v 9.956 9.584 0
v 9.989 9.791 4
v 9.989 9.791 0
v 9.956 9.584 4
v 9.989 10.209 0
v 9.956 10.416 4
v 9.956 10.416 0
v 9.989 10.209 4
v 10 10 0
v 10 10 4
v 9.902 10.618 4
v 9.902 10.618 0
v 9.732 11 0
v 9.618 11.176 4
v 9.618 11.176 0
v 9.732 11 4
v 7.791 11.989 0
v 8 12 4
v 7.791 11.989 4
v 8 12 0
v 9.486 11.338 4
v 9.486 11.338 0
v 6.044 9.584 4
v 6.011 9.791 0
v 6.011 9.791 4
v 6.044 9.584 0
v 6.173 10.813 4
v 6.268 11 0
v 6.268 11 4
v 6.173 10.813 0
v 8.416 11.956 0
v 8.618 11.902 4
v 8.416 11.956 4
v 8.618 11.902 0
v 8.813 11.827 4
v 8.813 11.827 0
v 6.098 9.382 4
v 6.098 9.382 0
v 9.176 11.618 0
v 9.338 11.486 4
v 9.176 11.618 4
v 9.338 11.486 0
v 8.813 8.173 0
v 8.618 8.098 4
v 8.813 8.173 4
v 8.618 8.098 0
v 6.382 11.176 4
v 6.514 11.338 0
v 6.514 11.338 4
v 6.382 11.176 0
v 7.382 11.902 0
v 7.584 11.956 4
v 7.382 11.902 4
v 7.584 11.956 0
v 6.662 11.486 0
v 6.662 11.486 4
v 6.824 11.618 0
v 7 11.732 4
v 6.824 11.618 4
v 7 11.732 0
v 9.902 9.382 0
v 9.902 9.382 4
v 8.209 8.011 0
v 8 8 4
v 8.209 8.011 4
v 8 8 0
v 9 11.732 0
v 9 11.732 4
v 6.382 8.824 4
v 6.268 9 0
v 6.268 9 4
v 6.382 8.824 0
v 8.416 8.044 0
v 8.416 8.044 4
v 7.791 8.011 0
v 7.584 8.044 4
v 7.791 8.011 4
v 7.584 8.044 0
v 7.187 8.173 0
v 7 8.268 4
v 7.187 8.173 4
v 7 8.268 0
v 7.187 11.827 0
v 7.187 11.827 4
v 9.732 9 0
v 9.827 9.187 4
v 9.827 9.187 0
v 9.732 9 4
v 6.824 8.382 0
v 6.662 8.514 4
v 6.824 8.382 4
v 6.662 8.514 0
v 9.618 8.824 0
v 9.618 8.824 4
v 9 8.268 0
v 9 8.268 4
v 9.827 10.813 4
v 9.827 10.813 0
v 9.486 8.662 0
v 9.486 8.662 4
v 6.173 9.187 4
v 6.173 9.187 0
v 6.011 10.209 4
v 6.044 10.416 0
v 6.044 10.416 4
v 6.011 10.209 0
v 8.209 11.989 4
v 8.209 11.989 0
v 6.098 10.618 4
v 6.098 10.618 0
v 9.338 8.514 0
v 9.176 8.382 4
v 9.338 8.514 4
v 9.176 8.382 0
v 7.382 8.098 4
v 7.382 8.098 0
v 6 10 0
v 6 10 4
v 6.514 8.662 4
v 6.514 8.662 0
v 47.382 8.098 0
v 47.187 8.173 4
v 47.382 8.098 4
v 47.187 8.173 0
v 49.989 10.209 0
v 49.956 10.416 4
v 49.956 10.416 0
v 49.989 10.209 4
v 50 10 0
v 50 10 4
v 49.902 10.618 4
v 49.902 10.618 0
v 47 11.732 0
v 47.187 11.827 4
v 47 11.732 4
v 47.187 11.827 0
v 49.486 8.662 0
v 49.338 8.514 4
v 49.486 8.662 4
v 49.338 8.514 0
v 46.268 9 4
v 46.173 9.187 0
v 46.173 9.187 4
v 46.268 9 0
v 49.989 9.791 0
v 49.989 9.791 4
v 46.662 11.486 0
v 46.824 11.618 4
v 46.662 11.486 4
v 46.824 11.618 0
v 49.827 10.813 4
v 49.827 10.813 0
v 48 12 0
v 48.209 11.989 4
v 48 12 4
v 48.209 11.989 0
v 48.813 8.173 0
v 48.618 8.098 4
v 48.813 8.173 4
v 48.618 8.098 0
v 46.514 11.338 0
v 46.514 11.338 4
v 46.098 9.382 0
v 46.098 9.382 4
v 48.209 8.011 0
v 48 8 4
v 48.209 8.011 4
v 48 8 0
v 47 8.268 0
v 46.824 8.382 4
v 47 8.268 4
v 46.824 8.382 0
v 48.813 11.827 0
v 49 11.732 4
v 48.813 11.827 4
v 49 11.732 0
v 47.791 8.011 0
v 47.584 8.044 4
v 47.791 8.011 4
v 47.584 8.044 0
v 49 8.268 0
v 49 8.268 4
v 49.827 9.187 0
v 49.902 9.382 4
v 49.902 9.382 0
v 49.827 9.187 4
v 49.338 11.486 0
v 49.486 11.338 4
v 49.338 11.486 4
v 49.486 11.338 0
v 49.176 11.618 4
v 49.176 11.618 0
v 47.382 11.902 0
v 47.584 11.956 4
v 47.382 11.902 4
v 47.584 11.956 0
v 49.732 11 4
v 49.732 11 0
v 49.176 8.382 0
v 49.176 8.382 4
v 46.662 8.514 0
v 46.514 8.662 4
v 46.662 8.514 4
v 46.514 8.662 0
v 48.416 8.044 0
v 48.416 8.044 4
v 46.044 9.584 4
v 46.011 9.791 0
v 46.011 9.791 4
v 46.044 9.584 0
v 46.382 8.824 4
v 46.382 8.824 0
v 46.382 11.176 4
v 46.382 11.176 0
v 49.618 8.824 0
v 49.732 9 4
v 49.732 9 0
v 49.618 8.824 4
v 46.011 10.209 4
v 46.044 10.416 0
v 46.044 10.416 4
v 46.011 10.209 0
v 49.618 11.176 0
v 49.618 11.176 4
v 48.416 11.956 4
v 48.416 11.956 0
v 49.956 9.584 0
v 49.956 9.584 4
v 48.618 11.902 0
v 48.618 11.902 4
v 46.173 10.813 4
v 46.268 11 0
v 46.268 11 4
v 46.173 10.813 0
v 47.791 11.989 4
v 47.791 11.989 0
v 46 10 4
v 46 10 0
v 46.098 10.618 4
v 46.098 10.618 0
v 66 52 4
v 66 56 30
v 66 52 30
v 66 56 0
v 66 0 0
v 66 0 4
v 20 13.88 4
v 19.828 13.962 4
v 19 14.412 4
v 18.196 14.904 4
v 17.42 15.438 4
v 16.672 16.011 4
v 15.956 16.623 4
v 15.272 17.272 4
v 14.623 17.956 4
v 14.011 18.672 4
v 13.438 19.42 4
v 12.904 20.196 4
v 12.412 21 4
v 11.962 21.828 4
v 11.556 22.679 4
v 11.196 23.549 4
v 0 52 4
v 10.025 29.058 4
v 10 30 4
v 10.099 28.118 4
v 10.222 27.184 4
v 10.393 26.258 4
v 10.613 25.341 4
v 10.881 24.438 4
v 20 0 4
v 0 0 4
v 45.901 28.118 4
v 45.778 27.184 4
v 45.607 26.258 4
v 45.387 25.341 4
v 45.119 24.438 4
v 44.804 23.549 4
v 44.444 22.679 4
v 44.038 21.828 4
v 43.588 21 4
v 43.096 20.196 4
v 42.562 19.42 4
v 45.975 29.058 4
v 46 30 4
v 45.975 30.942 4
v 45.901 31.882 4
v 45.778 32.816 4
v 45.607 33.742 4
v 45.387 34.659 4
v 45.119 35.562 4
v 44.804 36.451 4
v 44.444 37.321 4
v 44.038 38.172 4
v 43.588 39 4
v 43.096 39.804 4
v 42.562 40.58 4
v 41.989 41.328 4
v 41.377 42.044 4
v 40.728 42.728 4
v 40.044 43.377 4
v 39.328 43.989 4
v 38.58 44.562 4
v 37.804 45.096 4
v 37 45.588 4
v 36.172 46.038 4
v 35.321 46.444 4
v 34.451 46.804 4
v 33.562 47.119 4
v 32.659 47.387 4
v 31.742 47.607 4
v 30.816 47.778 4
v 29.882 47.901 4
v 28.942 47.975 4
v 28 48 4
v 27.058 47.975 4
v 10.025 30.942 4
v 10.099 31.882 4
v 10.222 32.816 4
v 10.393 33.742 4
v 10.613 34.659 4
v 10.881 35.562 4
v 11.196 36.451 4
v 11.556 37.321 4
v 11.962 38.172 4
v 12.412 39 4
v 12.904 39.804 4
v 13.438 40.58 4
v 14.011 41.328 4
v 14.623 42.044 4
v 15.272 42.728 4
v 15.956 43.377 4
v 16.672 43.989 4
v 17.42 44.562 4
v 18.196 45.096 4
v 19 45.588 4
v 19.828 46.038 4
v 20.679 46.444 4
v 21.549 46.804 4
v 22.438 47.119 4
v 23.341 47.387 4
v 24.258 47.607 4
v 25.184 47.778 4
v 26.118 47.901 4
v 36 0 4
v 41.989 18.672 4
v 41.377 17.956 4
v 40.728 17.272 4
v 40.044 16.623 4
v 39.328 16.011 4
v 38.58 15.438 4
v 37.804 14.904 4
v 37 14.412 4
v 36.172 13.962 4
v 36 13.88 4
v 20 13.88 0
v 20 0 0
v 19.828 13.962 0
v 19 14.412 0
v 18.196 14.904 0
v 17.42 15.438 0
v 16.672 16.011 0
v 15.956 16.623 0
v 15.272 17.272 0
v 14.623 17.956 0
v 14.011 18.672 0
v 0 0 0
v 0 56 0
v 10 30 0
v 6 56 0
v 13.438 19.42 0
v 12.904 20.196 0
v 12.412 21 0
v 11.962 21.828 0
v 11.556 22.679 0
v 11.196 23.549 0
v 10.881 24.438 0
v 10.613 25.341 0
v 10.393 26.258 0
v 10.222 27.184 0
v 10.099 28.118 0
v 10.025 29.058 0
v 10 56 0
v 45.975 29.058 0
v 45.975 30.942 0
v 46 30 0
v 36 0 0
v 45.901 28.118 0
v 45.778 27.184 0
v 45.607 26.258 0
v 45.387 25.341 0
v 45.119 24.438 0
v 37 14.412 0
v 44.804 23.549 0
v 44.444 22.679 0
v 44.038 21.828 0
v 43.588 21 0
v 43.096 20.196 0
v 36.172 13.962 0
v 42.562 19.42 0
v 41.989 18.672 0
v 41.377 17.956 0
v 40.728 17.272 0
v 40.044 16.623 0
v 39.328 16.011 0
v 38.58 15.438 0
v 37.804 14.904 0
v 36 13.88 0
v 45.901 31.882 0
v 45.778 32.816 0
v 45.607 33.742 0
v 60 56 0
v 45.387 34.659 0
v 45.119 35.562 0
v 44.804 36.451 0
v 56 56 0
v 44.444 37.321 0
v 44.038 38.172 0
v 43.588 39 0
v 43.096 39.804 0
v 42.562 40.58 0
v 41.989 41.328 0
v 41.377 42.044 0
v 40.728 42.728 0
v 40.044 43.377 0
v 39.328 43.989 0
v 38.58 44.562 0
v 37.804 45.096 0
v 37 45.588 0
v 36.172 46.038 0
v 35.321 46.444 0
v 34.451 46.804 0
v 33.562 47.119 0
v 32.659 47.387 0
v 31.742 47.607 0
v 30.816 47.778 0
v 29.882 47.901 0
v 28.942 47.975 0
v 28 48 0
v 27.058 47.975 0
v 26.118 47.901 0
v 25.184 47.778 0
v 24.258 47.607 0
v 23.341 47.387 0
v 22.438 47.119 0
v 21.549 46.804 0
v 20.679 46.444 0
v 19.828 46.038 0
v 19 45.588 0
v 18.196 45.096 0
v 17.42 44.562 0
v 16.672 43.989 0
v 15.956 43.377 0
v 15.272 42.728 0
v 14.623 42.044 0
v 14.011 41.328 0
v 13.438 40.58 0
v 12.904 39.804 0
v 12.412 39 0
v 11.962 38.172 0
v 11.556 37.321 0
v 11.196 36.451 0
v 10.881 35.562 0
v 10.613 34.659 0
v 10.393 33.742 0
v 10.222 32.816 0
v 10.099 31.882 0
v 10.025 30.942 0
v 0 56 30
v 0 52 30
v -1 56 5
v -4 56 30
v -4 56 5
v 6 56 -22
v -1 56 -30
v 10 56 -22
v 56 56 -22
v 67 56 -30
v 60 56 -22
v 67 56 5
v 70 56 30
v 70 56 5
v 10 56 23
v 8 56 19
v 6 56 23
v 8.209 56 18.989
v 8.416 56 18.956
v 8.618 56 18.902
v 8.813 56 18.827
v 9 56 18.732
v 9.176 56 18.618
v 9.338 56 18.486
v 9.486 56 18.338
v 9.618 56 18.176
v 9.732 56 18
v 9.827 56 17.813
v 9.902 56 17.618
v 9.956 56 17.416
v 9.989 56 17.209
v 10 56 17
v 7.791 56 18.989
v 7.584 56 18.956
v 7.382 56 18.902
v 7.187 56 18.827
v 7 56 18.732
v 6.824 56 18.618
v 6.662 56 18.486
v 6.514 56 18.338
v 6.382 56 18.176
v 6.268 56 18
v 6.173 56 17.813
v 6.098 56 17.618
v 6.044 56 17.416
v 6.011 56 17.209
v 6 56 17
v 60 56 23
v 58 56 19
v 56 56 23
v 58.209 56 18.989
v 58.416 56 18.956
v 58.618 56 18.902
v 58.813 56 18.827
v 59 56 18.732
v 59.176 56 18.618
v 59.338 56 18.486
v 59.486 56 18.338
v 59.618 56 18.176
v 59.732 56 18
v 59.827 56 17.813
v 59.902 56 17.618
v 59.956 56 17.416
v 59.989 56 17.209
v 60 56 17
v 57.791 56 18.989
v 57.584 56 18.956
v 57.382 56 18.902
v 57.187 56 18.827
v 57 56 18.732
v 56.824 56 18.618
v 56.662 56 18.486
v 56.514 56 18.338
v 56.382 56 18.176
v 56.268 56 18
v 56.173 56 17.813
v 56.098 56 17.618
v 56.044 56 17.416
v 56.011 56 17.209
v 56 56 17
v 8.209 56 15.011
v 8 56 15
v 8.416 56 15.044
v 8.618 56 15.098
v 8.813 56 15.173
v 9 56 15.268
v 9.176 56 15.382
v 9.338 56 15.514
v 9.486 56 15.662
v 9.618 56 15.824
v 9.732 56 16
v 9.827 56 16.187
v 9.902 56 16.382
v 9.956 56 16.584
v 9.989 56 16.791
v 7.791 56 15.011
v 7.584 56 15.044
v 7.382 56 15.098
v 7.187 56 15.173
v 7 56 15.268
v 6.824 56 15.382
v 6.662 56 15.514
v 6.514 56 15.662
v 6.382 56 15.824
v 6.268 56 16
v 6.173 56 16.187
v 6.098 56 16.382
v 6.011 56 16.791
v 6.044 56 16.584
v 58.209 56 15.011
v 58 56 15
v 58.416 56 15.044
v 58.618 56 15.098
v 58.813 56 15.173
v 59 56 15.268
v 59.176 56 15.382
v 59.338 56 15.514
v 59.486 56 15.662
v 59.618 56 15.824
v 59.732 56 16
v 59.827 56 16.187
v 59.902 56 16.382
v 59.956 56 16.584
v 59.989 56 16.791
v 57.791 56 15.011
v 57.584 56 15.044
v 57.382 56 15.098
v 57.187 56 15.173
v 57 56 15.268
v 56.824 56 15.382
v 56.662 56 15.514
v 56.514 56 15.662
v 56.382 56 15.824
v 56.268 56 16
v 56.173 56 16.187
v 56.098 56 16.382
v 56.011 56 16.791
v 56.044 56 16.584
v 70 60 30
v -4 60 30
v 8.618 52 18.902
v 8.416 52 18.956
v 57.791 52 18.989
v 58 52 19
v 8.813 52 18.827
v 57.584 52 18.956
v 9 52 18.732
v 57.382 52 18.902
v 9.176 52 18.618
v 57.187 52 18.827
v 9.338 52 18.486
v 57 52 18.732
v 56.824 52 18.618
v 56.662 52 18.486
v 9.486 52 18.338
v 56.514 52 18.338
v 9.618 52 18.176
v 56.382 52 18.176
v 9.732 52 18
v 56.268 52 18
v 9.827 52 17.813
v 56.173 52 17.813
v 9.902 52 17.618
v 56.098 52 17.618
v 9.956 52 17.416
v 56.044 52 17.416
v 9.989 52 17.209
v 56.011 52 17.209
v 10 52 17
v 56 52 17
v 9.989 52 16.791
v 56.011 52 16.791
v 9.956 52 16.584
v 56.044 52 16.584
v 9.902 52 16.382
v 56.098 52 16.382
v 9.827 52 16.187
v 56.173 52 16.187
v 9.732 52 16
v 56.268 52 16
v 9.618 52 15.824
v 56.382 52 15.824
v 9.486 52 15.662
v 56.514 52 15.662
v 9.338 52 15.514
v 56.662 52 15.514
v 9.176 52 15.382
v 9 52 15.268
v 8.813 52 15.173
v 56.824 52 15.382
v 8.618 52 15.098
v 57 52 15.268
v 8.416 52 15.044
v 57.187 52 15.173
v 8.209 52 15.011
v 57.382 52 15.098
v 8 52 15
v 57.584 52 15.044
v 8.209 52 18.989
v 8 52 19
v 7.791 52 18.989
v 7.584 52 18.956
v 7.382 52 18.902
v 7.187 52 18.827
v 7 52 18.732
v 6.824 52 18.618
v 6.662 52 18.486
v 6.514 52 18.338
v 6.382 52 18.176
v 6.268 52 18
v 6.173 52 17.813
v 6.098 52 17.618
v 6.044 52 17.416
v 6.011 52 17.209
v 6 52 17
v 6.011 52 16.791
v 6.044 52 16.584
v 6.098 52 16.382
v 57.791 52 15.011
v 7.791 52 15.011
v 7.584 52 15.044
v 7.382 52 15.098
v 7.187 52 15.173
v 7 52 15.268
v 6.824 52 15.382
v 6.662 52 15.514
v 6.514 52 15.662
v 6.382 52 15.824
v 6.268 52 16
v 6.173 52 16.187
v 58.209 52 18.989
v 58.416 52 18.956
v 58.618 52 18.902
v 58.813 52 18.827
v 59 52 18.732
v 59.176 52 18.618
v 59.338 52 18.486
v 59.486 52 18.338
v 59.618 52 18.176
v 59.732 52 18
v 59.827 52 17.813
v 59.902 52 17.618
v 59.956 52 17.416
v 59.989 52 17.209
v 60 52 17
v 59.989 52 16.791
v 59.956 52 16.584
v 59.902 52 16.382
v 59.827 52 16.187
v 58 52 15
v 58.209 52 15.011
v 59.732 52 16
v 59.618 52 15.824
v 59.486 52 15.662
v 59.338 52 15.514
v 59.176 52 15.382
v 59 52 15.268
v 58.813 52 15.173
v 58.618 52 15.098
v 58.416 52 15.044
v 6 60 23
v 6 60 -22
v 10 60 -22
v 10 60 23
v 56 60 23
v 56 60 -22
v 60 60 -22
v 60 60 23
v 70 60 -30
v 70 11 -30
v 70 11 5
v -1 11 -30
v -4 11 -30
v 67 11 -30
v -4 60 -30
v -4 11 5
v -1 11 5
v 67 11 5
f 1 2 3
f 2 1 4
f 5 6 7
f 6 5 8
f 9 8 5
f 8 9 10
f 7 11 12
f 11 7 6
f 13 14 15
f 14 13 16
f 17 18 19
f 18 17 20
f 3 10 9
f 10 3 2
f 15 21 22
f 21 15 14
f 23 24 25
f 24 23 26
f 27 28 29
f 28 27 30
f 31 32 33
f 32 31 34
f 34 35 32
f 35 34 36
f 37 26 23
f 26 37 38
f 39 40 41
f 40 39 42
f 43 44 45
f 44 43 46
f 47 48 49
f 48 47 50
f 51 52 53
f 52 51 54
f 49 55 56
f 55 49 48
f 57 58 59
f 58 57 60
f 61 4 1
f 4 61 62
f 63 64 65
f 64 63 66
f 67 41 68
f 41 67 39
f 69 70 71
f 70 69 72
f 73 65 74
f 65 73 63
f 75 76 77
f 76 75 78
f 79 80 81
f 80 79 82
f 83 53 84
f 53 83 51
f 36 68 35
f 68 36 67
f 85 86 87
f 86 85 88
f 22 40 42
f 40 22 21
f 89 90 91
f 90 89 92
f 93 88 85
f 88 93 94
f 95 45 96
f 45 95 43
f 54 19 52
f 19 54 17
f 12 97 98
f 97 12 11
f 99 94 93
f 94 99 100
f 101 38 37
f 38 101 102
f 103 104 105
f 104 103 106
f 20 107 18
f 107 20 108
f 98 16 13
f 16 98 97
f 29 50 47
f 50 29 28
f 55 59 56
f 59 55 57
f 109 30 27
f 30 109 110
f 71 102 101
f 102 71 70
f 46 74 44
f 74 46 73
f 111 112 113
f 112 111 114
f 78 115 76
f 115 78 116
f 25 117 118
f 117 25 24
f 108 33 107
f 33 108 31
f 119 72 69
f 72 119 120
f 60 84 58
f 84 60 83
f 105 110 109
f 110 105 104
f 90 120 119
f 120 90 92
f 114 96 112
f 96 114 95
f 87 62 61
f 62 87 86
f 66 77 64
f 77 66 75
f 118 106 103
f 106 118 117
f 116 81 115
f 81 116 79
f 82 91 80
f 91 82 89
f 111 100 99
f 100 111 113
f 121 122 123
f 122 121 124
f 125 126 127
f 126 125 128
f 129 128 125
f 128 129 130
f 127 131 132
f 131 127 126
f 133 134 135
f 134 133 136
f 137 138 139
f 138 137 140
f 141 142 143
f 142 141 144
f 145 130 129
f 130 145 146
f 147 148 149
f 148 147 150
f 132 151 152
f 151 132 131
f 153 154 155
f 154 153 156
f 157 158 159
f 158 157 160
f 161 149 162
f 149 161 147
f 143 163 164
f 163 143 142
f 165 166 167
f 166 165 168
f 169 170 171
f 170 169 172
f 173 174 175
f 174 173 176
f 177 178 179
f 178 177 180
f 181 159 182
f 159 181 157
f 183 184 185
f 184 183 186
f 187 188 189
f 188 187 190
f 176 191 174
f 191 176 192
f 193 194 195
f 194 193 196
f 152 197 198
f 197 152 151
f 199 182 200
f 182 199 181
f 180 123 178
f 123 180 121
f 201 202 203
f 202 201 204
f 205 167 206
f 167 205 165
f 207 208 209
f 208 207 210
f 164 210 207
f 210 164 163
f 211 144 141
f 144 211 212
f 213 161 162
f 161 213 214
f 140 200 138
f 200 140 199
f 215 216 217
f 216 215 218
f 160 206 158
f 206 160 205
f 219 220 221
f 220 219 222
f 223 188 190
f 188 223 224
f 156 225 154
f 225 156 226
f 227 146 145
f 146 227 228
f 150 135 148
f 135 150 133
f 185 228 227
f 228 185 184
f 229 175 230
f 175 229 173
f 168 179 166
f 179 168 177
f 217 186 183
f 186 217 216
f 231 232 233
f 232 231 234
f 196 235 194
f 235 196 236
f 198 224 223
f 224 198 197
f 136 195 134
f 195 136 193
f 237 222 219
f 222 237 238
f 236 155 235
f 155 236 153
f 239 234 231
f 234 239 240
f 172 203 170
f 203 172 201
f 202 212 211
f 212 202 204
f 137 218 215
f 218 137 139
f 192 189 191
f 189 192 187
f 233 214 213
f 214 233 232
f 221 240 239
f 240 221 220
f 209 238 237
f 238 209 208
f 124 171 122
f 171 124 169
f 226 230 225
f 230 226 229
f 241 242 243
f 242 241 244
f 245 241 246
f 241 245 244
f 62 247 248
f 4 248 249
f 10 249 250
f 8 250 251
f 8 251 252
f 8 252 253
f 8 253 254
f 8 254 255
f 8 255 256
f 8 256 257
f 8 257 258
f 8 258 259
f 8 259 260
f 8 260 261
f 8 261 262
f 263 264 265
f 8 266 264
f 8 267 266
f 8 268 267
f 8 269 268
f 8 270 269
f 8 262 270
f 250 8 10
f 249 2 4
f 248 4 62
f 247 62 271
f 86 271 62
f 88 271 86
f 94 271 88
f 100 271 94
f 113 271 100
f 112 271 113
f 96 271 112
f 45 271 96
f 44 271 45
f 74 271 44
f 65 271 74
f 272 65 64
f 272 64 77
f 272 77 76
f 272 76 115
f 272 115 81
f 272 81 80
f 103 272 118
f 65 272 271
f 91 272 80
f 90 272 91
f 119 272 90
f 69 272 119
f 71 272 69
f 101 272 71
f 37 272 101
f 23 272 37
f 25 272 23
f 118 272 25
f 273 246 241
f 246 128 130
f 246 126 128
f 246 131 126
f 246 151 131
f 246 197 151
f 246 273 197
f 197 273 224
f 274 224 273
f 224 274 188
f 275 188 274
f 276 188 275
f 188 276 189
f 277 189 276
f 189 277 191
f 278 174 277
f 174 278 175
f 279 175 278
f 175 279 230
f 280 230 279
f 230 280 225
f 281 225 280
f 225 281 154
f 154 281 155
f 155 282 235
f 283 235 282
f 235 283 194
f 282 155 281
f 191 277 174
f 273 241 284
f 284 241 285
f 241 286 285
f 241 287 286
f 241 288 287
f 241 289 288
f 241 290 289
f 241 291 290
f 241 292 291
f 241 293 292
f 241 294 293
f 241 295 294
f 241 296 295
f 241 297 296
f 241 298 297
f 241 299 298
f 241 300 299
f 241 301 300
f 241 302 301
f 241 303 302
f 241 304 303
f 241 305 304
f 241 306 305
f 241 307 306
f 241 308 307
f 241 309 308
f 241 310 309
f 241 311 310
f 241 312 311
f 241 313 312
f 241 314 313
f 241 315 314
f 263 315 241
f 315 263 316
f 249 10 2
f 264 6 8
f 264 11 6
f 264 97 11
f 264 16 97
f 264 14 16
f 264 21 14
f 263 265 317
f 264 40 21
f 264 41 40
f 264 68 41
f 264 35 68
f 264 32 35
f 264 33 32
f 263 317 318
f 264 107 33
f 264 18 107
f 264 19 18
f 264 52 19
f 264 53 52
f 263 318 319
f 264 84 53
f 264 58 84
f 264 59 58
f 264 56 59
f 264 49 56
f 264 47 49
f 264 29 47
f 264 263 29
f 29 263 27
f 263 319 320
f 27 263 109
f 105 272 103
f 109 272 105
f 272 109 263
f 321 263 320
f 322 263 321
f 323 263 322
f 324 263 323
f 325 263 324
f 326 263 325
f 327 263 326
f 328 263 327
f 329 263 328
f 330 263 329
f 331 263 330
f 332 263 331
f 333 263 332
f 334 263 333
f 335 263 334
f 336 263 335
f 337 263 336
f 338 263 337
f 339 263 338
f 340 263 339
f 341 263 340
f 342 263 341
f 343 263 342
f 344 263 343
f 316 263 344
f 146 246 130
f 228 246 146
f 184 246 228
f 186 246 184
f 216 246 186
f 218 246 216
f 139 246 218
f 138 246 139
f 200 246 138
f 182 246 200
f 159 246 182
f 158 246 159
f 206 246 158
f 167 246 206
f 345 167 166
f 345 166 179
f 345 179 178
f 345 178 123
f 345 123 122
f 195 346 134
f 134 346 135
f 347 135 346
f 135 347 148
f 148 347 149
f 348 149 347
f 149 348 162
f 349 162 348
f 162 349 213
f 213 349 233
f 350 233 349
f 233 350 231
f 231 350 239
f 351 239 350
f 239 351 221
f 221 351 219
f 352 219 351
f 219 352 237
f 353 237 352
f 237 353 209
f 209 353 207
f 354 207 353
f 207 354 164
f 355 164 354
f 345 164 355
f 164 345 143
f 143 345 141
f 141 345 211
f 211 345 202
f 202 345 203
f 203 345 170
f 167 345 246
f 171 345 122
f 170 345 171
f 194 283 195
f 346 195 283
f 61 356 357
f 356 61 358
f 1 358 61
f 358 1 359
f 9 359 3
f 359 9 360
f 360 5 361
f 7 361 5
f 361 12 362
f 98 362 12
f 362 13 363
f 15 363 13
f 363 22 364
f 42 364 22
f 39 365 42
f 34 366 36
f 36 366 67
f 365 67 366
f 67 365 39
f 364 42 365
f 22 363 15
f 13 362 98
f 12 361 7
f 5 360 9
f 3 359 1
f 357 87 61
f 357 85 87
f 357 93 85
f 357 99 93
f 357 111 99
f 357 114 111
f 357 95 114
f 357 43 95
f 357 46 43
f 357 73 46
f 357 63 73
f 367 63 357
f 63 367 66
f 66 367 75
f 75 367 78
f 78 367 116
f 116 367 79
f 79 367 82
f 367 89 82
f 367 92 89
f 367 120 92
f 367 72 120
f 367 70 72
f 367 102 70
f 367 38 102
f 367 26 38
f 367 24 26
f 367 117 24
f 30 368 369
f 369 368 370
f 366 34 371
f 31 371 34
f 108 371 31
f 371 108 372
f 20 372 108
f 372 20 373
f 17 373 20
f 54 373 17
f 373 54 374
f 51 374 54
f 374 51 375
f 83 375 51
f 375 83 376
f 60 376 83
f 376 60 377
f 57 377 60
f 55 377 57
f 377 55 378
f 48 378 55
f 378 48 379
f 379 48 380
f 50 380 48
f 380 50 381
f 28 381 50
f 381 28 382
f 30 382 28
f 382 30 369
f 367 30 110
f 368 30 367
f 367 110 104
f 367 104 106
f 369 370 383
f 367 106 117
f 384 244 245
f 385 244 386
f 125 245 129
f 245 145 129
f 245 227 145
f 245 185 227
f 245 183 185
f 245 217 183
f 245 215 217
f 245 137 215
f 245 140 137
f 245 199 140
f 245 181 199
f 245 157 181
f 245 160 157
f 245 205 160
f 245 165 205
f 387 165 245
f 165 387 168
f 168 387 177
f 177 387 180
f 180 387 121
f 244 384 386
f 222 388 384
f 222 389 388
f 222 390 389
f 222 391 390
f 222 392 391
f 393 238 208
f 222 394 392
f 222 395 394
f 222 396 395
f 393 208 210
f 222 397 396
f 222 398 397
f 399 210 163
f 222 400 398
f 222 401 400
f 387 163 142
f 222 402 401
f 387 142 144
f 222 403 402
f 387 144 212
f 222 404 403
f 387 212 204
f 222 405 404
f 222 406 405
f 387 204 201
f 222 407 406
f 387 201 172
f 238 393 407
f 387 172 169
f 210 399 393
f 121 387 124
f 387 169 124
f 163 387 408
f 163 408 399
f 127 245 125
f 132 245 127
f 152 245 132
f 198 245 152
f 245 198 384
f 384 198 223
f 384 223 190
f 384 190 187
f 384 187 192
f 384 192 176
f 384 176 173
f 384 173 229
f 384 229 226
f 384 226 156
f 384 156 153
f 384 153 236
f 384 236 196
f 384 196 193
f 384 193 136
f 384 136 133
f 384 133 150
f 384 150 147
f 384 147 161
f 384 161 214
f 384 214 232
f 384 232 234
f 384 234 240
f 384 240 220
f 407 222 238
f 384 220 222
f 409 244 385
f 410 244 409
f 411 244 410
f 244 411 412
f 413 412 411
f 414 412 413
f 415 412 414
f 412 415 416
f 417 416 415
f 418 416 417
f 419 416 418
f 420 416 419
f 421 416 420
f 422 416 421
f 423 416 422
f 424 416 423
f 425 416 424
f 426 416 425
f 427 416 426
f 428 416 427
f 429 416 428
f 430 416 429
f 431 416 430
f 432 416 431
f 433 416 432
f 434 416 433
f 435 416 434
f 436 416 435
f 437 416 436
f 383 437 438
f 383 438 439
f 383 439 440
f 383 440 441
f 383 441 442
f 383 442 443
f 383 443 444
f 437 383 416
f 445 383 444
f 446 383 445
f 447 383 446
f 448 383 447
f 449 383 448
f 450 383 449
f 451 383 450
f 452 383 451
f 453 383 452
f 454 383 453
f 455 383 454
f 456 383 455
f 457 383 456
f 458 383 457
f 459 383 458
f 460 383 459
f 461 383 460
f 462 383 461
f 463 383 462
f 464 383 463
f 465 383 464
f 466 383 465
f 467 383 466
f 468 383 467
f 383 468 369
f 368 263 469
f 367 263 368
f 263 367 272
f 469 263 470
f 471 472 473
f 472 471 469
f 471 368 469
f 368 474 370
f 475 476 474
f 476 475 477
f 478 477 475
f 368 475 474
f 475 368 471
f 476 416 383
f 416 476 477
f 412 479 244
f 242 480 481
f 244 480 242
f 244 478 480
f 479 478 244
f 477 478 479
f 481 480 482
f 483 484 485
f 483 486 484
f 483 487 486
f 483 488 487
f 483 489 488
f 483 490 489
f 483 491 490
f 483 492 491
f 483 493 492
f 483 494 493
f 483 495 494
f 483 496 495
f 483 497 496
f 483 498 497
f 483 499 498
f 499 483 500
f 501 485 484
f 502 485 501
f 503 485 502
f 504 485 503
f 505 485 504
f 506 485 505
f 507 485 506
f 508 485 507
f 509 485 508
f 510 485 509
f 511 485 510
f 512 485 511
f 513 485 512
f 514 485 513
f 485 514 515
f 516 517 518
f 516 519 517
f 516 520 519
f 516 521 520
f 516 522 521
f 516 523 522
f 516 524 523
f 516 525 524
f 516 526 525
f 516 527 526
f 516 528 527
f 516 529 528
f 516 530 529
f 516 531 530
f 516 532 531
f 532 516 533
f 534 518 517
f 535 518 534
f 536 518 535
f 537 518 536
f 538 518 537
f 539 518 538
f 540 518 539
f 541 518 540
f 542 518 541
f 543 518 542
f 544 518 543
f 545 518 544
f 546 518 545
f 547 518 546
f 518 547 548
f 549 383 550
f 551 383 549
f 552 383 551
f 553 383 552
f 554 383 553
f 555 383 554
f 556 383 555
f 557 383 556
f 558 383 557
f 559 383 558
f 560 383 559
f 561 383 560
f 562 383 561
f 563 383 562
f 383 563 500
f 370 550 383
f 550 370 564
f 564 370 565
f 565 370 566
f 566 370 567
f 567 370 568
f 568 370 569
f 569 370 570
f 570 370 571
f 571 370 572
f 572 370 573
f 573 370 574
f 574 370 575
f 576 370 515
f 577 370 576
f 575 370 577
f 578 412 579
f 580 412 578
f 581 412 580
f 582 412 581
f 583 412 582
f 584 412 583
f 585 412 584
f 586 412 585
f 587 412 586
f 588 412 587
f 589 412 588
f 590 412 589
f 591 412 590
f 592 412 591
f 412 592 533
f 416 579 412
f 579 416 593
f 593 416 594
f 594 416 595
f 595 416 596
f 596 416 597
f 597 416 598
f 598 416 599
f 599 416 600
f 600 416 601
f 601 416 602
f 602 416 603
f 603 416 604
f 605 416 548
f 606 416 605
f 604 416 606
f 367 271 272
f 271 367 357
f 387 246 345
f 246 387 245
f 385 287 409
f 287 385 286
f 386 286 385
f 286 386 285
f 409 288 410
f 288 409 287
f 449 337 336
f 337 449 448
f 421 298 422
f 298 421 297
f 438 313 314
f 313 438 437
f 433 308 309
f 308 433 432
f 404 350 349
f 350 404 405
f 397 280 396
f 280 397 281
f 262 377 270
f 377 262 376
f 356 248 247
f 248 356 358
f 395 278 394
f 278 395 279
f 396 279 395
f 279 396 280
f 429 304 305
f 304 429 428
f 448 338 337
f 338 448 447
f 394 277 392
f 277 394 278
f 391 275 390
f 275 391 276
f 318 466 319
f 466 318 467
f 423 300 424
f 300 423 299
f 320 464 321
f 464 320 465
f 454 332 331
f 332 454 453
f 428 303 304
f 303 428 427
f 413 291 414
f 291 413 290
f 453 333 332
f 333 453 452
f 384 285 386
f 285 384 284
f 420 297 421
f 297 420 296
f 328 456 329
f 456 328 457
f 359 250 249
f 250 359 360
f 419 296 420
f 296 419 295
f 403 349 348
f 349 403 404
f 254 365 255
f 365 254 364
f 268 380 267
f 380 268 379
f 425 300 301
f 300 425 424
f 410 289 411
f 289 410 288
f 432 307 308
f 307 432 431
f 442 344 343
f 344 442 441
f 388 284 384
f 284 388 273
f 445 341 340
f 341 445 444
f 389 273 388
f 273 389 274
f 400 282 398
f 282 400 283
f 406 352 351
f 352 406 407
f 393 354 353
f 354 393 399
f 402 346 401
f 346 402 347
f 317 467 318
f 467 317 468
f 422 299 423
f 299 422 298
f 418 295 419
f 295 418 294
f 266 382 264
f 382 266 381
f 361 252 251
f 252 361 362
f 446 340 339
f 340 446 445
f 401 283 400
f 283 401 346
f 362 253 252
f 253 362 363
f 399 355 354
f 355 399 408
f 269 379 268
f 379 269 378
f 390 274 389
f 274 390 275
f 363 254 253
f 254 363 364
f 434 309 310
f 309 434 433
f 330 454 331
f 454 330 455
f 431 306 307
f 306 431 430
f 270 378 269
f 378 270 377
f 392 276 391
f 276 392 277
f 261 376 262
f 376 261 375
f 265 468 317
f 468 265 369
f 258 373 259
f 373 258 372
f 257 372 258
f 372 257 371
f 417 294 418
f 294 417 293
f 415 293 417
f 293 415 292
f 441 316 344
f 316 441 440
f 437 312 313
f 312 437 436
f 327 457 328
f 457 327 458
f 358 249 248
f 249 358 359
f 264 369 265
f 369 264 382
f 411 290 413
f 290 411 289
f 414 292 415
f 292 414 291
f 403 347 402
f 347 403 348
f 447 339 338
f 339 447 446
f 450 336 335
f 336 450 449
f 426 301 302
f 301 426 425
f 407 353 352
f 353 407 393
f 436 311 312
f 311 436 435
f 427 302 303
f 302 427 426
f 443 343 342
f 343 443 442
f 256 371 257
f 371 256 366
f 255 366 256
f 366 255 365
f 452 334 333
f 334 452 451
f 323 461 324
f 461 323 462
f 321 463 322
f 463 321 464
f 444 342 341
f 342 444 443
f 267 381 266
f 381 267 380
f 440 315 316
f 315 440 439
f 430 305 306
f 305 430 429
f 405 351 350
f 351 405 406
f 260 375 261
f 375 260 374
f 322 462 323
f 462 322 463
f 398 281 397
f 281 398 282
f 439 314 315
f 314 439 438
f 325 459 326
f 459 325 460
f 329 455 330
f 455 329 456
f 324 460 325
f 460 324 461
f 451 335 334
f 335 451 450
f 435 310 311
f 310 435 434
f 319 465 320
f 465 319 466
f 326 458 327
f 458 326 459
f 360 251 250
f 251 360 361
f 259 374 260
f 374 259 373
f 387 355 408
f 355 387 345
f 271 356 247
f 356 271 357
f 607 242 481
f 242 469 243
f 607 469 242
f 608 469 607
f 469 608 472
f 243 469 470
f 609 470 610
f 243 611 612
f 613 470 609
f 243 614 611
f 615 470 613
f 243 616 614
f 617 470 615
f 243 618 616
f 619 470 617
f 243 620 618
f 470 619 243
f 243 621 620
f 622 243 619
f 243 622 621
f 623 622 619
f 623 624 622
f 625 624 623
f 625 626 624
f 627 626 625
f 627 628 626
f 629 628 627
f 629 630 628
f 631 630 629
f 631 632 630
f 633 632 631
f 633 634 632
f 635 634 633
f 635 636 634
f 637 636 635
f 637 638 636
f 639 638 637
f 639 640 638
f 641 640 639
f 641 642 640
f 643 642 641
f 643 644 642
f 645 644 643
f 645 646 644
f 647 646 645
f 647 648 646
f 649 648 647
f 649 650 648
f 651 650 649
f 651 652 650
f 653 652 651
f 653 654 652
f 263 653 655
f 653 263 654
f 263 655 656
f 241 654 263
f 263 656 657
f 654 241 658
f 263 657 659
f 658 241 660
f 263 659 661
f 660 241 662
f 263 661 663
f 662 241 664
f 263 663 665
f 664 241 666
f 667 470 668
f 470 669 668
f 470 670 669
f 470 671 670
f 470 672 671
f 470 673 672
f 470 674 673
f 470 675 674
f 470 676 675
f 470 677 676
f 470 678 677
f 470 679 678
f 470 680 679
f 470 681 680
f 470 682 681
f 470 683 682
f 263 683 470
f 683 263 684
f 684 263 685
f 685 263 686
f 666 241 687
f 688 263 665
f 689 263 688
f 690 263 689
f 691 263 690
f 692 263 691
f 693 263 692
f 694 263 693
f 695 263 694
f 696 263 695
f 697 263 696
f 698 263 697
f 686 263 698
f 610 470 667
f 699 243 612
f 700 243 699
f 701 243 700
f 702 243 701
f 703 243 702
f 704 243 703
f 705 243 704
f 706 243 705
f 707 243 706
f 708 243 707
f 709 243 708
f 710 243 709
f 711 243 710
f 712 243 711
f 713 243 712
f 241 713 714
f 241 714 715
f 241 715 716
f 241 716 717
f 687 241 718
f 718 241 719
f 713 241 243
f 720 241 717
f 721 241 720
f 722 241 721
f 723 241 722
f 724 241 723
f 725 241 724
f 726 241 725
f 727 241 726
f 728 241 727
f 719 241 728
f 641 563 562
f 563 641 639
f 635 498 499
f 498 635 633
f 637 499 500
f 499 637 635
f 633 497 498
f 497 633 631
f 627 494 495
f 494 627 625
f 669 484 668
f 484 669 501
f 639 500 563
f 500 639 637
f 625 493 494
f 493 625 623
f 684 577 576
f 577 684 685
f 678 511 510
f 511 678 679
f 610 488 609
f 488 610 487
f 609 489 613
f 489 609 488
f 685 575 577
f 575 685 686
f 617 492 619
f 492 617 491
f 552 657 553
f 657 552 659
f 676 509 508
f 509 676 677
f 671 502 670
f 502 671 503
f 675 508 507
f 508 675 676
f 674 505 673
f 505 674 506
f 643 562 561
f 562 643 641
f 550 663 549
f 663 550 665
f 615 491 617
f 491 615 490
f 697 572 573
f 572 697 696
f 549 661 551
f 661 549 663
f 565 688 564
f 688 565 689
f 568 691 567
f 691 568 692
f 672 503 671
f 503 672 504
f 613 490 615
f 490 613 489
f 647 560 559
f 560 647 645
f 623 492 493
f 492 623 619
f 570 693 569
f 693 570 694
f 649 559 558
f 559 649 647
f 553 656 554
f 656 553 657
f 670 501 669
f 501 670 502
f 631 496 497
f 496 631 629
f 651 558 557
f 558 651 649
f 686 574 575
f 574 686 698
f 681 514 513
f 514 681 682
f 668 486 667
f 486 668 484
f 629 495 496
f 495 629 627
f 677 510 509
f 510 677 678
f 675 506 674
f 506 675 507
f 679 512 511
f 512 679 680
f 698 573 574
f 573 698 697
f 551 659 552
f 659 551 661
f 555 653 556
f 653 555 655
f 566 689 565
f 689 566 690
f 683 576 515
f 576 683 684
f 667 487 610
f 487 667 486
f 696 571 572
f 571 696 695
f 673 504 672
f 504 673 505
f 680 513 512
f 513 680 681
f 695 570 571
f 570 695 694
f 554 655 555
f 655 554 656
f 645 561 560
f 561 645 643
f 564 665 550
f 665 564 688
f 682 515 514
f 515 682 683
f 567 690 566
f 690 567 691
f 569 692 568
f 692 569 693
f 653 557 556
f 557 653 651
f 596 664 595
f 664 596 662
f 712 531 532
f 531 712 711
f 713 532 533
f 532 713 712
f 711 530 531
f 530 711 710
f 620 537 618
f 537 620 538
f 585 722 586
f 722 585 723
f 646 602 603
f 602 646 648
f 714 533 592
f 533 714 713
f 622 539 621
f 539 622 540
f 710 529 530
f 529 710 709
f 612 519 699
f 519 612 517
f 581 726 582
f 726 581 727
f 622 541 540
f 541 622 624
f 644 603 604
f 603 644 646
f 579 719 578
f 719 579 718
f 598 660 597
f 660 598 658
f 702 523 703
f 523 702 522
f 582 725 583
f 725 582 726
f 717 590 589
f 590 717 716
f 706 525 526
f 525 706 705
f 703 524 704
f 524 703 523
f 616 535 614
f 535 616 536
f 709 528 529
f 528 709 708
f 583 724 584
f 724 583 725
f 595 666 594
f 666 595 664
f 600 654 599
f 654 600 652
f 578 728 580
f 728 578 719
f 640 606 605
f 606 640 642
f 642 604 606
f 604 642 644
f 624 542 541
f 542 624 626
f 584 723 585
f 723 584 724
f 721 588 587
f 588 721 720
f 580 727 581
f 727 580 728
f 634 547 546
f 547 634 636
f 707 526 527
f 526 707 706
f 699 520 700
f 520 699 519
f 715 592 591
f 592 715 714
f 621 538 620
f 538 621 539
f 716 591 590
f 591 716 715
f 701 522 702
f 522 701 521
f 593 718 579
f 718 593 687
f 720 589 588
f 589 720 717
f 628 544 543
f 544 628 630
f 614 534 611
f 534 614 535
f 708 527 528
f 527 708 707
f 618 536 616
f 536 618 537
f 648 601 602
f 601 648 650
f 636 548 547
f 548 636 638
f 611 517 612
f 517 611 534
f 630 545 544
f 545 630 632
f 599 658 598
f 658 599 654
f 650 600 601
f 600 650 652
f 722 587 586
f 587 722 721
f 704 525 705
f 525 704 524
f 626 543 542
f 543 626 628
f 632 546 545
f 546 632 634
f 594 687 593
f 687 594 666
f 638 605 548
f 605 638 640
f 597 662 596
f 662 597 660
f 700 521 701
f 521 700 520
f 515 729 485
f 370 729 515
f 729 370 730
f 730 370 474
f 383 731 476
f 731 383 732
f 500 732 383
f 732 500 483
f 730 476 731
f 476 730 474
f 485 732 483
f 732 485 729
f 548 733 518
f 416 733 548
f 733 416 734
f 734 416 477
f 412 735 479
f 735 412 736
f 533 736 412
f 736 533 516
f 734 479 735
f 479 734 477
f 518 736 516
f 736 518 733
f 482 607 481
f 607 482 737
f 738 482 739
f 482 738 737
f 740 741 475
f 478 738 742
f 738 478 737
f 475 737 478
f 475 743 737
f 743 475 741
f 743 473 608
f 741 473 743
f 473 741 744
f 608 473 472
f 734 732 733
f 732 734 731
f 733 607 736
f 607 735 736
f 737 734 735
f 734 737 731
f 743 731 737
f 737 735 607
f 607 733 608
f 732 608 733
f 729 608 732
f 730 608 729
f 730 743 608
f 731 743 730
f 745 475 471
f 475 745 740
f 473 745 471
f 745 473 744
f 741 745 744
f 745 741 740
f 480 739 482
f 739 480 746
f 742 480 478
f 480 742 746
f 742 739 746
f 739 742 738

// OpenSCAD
module main () {
    difference() {
        difference (){
            cube([66,56,4],center=false);
            translate([8, 10, -0.5]) {
                cylinder(h=5, r=2, $fn=60, center=false);
                translate([40, 0, 0]) {
                    cylinder(h=5, r=2, $fn=60, center=false);
                }
            }
        }
        
        union() {
            translate([56/2, 30, -0.5]) {
                cylinder(h=10, r=18, $fn=120, center=true);
            }
            translate([56/2 - 8, -6, -0.5]) {
                cube([16,20,5],center=false);
            }
        }
    }
}

module back () {
    translate([0, 52, 0]) {
    cube([66,4,30],center=false);
    }    
}

module back_holes () {
    rotate([90, 0, 0]) {
        translate([8, 15+2, -57]) {
            cylinder(h=6, r=2, $fn=60, center=false);
            translate([50, 0, 0]) {
                cylinder(h=6, r=2, $fn=60, center=false);
            }
        }
    }
}

module mount_one() {
    difference() {
        union () {
            main();
            back();
        }

        back_holes();
    }
}

module mount_two_back() {
    translate([-4, 56, -30]) {
        cube([74,4,60],center=false);
    }
}

module hole_bars() {    
    translate([6, 60.5, -22]) {
        rotate([90, 0, 0]) {
            cube([4, 45, 5], center=false);
        }
    }
    translate([56, 60.5, -22]) {
        rotate([90, 0, 0]) {
            cube([4, 45, 5], center=false);
        }
    }
}

module mount_two() {
    difference () {
        mount_two_back();
        hole_bars();
    }

    translate([-4, 11, -30]) {
        cube([3, 45, 35], center=false);
    }
    
    translate([67, 11, -30]) {
        cube([3, 45, 35], center=false);
    }
}

mount_one();
mount_two();
